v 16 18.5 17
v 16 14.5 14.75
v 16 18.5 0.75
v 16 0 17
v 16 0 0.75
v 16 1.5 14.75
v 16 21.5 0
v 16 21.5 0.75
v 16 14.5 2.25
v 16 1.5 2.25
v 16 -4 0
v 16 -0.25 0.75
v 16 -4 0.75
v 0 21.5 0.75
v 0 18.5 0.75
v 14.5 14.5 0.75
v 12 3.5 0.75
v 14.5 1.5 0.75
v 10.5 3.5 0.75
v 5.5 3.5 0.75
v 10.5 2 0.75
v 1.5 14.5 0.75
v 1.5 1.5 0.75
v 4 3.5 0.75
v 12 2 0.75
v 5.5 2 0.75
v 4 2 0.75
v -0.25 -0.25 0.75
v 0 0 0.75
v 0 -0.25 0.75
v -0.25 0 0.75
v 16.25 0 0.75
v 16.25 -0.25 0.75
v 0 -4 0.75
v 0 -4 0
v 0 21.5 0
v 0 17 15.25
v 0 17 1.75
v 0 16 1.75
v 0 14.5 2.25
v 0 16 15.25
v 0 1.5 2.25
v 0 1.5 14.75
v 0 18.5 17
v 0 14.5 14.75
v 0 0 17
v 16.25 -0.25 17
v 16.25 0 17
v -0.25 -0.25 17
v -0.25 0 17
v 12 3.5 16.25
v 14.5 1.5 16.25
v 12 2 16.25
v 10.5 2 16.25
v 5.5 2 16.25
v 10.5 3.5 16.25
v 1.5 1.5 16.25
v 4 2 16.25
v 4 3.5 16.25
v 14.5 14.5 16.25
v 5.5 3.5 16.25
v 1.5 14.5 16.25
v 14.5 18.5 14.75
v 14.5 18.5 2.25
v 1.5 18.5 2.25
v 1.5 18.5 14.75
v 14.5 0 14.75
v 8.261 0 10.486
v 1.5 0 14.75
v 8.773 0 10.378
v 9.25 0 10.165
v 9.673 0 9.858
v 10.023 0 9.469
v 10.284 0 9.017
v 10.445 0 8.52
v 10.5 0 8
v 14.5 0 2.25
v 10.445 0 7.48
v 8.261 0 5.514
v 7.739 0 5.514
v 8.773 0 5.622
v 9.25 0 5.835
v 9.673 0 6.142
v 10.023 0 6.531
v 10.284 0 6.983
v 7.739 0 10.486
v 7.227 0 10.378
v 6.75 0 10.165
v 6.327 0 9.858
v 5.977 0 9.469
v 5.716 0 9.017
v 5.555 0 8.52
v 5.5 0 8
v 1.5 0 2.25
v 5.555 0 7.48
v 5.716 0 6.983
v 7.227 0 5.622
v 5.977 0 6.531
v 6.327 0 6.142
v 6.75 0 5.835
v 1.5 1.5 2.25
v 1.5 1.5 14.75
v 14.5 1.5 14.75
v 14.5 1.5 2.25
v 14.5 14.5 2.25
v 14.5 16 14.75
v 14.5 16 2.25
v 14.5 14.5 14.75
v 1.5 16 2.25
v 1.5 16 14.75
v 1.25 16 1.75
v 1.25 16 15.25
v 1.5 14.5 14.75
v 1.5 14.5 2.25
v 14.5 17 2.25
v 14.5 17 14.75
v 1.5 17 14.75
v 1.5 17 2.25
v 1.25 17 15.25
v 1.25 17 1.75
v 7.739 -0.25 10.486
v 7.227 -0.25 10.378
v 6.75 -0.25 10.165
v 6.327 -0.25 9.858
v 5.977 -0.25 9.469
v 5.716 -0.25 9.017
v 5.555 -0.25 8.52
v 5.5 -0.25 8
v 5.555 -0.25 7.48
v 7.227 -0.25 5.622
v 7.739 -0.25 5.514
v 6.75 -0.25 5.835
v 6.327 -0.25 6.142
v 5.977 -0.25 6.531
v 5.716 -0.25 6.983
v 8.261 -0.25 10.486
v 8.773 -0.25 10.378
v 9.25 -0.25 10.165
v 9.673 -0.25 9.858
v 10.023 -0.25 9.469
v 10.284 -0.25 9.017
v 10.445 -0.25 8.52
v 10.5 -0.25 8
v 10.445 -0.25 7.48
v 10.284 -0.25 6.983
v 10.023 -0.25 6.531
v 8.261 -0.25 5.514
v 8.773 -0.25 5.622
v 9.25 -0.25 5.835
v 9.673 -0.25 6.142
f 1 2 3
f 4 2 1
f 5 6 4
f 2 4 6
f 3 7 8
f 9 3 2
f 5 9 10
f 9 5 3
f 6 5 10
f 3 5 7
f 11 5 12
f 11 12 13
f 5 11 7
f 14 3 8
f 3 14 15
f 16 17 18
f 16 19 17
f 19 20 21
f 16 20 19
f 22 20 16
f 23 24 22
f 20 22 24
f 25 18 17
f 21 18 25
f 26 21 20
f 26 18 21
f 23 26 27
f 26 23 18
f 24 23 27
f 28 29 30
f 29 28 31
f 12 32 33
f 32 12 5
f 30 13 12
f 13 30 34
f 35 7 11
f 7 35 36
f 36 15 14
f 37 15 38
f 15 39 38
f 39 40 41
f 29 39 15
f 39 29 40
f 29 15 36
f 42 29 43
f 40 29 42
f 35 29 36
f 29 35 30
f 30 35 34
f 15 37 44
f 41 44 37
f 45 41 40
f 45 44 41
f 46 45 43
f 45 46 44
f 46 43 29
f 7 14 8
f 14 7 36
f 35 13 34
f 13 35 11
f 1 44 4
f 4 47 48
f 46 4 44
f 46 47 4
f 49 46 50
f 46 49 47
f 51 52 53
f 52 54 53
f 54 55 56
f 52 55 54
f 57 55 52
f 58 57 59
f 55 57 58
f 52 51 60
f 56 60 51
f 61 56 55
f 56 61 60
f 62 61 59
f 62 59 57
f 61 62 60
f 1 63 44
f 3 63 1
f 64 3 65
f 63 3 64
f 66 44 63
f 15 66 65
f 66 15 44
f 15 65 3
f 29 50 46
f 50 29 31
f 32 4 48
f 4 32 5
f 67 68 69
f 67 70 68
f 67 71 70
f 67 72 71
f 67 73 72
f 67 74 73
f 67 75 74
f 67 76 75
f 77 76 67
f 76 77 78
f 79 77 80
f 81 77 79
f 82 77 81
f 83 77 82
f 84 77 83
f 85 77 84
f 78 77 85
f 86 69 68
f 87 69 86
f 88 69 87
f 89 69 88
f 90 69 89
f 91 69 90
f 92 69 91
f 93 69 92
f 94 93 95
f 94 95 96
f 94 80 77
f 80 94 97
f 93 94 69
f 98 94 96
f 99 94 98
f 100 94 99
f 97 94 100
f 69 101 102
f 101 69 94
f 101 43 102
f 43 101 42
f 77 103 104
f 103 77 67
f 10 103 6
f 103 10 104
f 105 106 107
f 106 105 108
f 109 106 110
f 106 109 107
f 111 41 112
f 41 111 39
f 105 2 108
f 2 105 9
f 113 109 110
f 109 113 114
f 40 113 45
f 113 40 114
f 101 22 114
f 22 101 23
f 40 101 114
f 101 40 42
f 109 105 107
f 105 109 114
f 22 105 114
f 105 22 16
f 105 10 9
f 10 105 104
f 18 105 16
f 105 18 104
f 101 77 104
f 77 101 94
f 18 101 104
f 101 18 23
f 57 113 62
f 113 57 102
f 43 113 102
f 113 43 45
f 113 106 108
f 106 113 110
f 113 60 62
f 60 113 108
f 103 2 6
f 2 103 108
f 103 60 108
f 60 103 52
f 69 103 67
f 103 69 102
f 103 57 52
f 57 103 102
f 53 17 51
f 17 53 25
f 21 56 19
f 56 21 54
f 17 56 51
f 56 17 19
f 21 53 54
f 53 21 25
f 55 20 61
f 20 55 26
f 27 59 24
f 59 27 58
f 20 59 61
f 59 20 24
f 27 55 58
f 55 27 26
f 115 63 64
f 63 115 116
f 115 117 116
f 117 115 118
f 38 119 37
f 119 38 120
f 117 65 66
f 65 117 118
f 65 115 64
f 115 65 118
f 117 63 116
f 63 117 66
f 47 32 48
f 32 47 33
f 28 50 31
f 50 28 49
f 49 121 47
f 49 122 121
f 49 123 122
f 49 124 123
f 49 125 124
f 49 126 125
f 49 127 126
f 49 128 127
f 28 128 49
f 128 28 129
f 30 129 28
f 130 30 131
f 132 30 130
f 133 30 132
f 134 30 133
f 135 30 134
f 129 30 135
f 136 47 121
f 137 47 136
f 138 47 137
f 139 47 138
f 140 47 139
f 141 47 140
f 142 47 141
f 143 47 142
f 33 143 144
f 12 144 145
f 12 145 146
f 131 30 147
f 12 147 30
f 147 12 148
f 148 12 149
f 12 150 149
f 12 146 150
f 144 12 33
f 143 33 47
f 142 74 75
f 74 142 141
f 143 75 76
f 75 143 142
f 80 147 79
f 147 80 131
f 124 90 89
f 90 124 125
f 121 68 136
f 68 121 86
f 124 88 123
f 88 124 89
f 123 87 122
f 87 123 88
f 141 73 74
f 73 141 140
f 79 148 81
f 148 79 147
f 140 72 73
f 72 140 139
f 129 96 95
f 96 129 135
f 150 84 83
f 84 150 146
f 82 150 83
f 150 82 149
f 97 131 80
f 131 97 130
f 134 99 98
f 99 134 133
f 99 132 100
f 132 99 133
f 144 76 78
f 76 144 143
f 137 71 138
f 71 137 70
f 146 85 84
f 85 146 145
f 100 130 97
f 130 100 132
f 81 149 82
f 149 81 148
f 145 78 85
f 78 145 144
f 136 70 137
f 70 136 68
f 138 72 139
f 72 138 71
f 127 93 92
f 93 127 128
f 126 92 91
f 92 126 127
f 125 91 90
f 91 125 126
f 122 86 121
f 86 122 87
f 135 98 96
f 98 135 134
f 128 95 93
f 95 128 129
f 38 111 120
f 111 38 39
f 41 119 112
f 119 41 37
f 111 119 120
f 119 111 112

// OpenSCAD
$fn = 30;
box_width = 16;
pole_hieght = 15.5;
sheet_thickness = 3/4;
pole_thickness = 1.5;
wall_thickness = 1/4; 
base_thickness = 25.5;
holder_thickness = 1;


//should probably just be 'wood' but too late lol
module sheet(width, length, thickness,
    xness, yness, vertical){

    translate([xness,yness,vertical]){
    cube([width,length,thickness]);   
    } 
}


color([.7,.7,.5]){
sheet(box_width,base_thickness,sheet_thickness,0,-4,0);

sheet(box_width,
box_width + holder_thickness + pole_thickness,sheet_thickness
,0,0,pole_hieght+sheet_thickness);
}
//vertical poles
color([0,.5,.4]){
sheet(pole_thickness,pole_thickness,pole_hieght,
0,0,sheet_thickness);

 sheet(pole_thickness,pole_thickness,pole_hieght,
box_width - pole_thickness,0,sheet_thickness);

# sheet(pole_thickness,pole_thickness,pole_hieght,
box_width - pole_thickness,box_width - pole_thickness,sheet_thickness);

# sheet(pole_thickness,pole_thickness,pole_hieght,
0,box_width - pole_thickness,sheet_thickness);
    
}
//horizantal poles for screws - bottom
color("purple"){
 sheet(pole_thickness,box_width -
    pole_thickness * 2,pole_thickness,
    0,pole_thickness,sheet_thickness);
   
 sheet(box_width - pole_thickness * 2,
    pole_thickness,pole_thickness,
    pole_thickness,box_width - pole_thickness,sheet_thickness);
    
 sheet(pole_thickness,box_width -
    pole_thickness * 2,pole_thickness,
    box_width - pole_thickness,pole_thickness,sheet_thickness);
    
 sheet(box_width - pole_thickness * 2,
    pole_thickness,pole_thickness,
    pole_thickness,0,sheet_thickness);
    
//horizantal poles for screws - top    
 sheet(pole_thickness,box_width -
    pole_thickness * 2,pole_thickness,
    0,pole_thickness,pole_hieght - sheet_thickness);
   
 sheet(box_width - pole_thickness * 2,
    pole_thickness,pole_thickness,
    pole_thickness,box_width - pole_thickness,pole_hieght - sheet_thickness);
    
 sheet(pole_thickness,box_width -
    pole_thickness * 2,pole_thickness,
    box_width - pole_thickness,pole_thickness,pole_hieght - sheet_thickness);
    
 sheet(box_width - pole_thickness * 2,
    pole_thickness,pole_thickness,
    pole_thickness,0,pole_hieght - sheet_thickness);
}
//mounting poles
color([0,.5,.4]){
 sheet(pole_thickness,pole_thickness,pole_hieght,
10.5,2,sheet_thickness);

 sheet(pole_thickness,pole_thickness,pole_hieght,
4,2,sheet_thickness);
}

//filter poles
color([0,.5,.5]){
sheet(pole_thickness,pole_thickness,pole_hieght,
box_width - pole_thickness,box_width + holder_thickness,sheet_thickness);

sheet(pole_thickness,pole_thickness,pole_hieght,
0,box_width + holder_thickness,sheet_thickness);
}
//filter holders
color([0,0,1])
sheet(box_width,holder_thickness,holder_thickness,
0,box_width,sheet_thickness);

color([0,0,1])
sheet(box_width,holder_thickness,holder_thickness,
0,box_width,
pole_hieght - 1/4);

color([0,.3,.5])
sheet(holder_thickness + .25,holder_thickness,pole_hieght - 2,
box_width - pole_thickness + .25,box_width,sheet_thickness + 1);

color([1,0,1]){
//outer filter holders
 sheet(box_width - pole_thickness * 2,
    pole_thickness,pole_thickness,
    pole_thickness,box_width - pole_thickness + 2.5,sheet_thickness);
    
 sheet(box_width - pole_thickness * 2,
    pole_thickness,pole_thickness,
    pole_thickness,box_width - pole_thickness + 2.5,pole_hieght - sheet_thickness);
}

//filter
color([0,1,0])
sheet(13.5,1,13.5,
1.5 - .25,box_width,
1.75);
  
//the walls  
 //color([0,.5,0])
% sheet(wall_thickness,box_width,
    pole_hieght + (sheet_thickness * 2),
    -1 * wall_thickness,0,0);
 //color([1,0,0])
% sheet(wall_thickness,box_width + 2.5,
    pole_hieght + (sheet_thickness * 2),
    box_width,0,0);
    
// makes the hole    
difference(){
    color([1,.5,0])
    sheet(box_width + wall_thickness * 2,wall_thickness,
    pole_hieght + sheet_thickness,
    - wall_thickness,-1 * wall_thickness,sheet_thickness);

    rotate([90,0,0]){
        translate([8,8,-1]){
            cylinder(h = 4, r = 2.5);
            }
     }
}





    
    
    
